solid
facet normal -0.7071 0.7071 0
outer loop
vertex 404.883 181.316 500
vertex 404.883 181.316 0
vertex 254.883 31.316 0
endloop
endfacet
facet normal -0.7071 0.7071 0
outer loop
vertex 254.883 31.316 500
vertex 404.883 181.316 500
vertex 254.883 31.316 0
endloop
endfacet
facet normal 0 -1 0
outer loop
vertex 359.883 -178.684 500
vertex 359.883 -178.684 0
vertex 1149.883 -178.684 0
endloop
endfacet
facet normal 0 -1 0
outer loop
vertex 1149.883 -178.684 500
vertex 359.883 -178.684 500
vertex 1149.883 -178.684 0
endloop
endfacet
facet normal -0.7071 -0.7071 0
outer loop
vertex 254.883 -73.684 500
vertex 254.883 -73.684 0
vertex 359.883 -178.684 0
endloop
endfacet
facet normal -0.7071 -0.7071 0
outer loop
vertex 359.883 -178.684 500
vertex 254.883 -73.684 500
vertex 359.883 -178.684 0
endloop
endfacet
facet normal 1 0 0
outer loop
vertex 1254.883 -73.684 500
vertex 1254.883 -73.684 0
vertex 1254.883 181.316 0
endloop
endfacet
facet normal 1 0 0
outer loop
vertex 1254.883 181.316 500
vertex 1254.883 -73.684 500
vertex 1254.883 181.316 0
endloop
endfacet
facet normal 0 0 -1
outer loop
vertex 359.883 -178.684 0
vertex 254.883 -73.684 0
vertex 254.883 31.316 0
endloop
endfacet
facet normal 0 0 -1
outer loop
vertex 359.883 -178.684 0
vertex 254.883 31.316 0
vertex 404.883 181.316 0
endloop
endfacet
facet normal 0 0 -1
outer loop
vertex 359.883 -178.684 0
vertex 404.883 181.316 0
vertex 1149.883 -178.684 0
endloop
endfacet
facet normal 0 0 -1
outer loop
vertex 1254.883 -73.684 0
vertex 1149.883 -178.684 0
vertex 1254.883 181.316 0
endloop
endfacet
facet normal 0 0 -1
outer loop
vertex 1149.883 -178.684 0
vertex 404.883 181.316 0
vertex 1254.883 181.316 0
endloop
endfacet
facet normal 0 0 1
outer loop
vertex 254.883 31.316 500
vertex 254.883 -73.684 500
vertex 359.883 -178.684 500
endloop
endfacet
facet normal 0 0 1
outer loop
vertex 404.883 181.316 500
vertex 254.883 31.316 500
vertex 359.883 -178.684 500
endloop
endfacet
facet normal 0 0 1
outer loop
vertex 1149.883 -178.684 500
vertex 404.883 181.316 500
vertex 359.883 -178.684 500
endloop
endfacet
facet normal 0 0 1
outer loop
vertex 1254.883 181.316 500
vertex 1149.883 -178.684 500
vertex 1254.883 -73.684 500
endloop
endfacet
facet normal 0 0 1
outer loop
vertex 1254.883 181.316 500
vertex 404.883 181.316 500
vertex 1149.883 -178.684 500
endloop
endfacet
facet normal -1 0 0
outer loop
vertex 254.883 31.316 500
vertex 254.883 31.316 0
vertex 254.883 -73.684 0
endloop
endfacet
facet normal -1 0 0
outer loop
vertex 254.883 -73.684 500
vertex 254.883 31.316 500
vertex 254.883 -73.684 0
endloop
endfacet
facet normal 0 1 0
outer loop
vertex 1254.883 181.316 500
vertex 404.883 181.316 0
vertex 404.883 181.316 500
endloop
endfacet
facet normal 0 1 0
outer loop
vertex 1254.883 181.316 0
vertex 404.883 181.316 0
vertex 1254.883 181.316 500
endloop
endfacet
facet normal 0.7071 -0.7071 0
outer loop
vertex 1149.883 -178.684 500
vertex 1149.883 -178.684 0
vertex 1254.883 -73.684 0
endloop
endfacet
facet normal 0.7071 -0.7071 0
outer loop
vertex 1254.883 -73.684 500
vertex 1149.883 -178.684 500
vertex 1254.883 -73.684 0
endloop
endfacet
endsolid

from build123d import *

# Parameters (mm, degrees)
BOSS_EXTRU_1_DEPTH = 500


with BuildPart() as part:
    # Esquisse1 → Boss.-Extru.1 (new body)
    with BuildSketch(Plane.XY):
        Polygon((404.882928221, 181.315844241), (254.882928221, 31.315844241), (254.882928221, -73.684155759), (359.882928221, -178.684155759), (1149.882928221, -178.684155759), (1254.882928221, -73.684155759), (1254.882928221, 181.315844241), align=None)
    extrude(amount=BOSS_EXTRU_1_DEPTH)


solid = part.part
